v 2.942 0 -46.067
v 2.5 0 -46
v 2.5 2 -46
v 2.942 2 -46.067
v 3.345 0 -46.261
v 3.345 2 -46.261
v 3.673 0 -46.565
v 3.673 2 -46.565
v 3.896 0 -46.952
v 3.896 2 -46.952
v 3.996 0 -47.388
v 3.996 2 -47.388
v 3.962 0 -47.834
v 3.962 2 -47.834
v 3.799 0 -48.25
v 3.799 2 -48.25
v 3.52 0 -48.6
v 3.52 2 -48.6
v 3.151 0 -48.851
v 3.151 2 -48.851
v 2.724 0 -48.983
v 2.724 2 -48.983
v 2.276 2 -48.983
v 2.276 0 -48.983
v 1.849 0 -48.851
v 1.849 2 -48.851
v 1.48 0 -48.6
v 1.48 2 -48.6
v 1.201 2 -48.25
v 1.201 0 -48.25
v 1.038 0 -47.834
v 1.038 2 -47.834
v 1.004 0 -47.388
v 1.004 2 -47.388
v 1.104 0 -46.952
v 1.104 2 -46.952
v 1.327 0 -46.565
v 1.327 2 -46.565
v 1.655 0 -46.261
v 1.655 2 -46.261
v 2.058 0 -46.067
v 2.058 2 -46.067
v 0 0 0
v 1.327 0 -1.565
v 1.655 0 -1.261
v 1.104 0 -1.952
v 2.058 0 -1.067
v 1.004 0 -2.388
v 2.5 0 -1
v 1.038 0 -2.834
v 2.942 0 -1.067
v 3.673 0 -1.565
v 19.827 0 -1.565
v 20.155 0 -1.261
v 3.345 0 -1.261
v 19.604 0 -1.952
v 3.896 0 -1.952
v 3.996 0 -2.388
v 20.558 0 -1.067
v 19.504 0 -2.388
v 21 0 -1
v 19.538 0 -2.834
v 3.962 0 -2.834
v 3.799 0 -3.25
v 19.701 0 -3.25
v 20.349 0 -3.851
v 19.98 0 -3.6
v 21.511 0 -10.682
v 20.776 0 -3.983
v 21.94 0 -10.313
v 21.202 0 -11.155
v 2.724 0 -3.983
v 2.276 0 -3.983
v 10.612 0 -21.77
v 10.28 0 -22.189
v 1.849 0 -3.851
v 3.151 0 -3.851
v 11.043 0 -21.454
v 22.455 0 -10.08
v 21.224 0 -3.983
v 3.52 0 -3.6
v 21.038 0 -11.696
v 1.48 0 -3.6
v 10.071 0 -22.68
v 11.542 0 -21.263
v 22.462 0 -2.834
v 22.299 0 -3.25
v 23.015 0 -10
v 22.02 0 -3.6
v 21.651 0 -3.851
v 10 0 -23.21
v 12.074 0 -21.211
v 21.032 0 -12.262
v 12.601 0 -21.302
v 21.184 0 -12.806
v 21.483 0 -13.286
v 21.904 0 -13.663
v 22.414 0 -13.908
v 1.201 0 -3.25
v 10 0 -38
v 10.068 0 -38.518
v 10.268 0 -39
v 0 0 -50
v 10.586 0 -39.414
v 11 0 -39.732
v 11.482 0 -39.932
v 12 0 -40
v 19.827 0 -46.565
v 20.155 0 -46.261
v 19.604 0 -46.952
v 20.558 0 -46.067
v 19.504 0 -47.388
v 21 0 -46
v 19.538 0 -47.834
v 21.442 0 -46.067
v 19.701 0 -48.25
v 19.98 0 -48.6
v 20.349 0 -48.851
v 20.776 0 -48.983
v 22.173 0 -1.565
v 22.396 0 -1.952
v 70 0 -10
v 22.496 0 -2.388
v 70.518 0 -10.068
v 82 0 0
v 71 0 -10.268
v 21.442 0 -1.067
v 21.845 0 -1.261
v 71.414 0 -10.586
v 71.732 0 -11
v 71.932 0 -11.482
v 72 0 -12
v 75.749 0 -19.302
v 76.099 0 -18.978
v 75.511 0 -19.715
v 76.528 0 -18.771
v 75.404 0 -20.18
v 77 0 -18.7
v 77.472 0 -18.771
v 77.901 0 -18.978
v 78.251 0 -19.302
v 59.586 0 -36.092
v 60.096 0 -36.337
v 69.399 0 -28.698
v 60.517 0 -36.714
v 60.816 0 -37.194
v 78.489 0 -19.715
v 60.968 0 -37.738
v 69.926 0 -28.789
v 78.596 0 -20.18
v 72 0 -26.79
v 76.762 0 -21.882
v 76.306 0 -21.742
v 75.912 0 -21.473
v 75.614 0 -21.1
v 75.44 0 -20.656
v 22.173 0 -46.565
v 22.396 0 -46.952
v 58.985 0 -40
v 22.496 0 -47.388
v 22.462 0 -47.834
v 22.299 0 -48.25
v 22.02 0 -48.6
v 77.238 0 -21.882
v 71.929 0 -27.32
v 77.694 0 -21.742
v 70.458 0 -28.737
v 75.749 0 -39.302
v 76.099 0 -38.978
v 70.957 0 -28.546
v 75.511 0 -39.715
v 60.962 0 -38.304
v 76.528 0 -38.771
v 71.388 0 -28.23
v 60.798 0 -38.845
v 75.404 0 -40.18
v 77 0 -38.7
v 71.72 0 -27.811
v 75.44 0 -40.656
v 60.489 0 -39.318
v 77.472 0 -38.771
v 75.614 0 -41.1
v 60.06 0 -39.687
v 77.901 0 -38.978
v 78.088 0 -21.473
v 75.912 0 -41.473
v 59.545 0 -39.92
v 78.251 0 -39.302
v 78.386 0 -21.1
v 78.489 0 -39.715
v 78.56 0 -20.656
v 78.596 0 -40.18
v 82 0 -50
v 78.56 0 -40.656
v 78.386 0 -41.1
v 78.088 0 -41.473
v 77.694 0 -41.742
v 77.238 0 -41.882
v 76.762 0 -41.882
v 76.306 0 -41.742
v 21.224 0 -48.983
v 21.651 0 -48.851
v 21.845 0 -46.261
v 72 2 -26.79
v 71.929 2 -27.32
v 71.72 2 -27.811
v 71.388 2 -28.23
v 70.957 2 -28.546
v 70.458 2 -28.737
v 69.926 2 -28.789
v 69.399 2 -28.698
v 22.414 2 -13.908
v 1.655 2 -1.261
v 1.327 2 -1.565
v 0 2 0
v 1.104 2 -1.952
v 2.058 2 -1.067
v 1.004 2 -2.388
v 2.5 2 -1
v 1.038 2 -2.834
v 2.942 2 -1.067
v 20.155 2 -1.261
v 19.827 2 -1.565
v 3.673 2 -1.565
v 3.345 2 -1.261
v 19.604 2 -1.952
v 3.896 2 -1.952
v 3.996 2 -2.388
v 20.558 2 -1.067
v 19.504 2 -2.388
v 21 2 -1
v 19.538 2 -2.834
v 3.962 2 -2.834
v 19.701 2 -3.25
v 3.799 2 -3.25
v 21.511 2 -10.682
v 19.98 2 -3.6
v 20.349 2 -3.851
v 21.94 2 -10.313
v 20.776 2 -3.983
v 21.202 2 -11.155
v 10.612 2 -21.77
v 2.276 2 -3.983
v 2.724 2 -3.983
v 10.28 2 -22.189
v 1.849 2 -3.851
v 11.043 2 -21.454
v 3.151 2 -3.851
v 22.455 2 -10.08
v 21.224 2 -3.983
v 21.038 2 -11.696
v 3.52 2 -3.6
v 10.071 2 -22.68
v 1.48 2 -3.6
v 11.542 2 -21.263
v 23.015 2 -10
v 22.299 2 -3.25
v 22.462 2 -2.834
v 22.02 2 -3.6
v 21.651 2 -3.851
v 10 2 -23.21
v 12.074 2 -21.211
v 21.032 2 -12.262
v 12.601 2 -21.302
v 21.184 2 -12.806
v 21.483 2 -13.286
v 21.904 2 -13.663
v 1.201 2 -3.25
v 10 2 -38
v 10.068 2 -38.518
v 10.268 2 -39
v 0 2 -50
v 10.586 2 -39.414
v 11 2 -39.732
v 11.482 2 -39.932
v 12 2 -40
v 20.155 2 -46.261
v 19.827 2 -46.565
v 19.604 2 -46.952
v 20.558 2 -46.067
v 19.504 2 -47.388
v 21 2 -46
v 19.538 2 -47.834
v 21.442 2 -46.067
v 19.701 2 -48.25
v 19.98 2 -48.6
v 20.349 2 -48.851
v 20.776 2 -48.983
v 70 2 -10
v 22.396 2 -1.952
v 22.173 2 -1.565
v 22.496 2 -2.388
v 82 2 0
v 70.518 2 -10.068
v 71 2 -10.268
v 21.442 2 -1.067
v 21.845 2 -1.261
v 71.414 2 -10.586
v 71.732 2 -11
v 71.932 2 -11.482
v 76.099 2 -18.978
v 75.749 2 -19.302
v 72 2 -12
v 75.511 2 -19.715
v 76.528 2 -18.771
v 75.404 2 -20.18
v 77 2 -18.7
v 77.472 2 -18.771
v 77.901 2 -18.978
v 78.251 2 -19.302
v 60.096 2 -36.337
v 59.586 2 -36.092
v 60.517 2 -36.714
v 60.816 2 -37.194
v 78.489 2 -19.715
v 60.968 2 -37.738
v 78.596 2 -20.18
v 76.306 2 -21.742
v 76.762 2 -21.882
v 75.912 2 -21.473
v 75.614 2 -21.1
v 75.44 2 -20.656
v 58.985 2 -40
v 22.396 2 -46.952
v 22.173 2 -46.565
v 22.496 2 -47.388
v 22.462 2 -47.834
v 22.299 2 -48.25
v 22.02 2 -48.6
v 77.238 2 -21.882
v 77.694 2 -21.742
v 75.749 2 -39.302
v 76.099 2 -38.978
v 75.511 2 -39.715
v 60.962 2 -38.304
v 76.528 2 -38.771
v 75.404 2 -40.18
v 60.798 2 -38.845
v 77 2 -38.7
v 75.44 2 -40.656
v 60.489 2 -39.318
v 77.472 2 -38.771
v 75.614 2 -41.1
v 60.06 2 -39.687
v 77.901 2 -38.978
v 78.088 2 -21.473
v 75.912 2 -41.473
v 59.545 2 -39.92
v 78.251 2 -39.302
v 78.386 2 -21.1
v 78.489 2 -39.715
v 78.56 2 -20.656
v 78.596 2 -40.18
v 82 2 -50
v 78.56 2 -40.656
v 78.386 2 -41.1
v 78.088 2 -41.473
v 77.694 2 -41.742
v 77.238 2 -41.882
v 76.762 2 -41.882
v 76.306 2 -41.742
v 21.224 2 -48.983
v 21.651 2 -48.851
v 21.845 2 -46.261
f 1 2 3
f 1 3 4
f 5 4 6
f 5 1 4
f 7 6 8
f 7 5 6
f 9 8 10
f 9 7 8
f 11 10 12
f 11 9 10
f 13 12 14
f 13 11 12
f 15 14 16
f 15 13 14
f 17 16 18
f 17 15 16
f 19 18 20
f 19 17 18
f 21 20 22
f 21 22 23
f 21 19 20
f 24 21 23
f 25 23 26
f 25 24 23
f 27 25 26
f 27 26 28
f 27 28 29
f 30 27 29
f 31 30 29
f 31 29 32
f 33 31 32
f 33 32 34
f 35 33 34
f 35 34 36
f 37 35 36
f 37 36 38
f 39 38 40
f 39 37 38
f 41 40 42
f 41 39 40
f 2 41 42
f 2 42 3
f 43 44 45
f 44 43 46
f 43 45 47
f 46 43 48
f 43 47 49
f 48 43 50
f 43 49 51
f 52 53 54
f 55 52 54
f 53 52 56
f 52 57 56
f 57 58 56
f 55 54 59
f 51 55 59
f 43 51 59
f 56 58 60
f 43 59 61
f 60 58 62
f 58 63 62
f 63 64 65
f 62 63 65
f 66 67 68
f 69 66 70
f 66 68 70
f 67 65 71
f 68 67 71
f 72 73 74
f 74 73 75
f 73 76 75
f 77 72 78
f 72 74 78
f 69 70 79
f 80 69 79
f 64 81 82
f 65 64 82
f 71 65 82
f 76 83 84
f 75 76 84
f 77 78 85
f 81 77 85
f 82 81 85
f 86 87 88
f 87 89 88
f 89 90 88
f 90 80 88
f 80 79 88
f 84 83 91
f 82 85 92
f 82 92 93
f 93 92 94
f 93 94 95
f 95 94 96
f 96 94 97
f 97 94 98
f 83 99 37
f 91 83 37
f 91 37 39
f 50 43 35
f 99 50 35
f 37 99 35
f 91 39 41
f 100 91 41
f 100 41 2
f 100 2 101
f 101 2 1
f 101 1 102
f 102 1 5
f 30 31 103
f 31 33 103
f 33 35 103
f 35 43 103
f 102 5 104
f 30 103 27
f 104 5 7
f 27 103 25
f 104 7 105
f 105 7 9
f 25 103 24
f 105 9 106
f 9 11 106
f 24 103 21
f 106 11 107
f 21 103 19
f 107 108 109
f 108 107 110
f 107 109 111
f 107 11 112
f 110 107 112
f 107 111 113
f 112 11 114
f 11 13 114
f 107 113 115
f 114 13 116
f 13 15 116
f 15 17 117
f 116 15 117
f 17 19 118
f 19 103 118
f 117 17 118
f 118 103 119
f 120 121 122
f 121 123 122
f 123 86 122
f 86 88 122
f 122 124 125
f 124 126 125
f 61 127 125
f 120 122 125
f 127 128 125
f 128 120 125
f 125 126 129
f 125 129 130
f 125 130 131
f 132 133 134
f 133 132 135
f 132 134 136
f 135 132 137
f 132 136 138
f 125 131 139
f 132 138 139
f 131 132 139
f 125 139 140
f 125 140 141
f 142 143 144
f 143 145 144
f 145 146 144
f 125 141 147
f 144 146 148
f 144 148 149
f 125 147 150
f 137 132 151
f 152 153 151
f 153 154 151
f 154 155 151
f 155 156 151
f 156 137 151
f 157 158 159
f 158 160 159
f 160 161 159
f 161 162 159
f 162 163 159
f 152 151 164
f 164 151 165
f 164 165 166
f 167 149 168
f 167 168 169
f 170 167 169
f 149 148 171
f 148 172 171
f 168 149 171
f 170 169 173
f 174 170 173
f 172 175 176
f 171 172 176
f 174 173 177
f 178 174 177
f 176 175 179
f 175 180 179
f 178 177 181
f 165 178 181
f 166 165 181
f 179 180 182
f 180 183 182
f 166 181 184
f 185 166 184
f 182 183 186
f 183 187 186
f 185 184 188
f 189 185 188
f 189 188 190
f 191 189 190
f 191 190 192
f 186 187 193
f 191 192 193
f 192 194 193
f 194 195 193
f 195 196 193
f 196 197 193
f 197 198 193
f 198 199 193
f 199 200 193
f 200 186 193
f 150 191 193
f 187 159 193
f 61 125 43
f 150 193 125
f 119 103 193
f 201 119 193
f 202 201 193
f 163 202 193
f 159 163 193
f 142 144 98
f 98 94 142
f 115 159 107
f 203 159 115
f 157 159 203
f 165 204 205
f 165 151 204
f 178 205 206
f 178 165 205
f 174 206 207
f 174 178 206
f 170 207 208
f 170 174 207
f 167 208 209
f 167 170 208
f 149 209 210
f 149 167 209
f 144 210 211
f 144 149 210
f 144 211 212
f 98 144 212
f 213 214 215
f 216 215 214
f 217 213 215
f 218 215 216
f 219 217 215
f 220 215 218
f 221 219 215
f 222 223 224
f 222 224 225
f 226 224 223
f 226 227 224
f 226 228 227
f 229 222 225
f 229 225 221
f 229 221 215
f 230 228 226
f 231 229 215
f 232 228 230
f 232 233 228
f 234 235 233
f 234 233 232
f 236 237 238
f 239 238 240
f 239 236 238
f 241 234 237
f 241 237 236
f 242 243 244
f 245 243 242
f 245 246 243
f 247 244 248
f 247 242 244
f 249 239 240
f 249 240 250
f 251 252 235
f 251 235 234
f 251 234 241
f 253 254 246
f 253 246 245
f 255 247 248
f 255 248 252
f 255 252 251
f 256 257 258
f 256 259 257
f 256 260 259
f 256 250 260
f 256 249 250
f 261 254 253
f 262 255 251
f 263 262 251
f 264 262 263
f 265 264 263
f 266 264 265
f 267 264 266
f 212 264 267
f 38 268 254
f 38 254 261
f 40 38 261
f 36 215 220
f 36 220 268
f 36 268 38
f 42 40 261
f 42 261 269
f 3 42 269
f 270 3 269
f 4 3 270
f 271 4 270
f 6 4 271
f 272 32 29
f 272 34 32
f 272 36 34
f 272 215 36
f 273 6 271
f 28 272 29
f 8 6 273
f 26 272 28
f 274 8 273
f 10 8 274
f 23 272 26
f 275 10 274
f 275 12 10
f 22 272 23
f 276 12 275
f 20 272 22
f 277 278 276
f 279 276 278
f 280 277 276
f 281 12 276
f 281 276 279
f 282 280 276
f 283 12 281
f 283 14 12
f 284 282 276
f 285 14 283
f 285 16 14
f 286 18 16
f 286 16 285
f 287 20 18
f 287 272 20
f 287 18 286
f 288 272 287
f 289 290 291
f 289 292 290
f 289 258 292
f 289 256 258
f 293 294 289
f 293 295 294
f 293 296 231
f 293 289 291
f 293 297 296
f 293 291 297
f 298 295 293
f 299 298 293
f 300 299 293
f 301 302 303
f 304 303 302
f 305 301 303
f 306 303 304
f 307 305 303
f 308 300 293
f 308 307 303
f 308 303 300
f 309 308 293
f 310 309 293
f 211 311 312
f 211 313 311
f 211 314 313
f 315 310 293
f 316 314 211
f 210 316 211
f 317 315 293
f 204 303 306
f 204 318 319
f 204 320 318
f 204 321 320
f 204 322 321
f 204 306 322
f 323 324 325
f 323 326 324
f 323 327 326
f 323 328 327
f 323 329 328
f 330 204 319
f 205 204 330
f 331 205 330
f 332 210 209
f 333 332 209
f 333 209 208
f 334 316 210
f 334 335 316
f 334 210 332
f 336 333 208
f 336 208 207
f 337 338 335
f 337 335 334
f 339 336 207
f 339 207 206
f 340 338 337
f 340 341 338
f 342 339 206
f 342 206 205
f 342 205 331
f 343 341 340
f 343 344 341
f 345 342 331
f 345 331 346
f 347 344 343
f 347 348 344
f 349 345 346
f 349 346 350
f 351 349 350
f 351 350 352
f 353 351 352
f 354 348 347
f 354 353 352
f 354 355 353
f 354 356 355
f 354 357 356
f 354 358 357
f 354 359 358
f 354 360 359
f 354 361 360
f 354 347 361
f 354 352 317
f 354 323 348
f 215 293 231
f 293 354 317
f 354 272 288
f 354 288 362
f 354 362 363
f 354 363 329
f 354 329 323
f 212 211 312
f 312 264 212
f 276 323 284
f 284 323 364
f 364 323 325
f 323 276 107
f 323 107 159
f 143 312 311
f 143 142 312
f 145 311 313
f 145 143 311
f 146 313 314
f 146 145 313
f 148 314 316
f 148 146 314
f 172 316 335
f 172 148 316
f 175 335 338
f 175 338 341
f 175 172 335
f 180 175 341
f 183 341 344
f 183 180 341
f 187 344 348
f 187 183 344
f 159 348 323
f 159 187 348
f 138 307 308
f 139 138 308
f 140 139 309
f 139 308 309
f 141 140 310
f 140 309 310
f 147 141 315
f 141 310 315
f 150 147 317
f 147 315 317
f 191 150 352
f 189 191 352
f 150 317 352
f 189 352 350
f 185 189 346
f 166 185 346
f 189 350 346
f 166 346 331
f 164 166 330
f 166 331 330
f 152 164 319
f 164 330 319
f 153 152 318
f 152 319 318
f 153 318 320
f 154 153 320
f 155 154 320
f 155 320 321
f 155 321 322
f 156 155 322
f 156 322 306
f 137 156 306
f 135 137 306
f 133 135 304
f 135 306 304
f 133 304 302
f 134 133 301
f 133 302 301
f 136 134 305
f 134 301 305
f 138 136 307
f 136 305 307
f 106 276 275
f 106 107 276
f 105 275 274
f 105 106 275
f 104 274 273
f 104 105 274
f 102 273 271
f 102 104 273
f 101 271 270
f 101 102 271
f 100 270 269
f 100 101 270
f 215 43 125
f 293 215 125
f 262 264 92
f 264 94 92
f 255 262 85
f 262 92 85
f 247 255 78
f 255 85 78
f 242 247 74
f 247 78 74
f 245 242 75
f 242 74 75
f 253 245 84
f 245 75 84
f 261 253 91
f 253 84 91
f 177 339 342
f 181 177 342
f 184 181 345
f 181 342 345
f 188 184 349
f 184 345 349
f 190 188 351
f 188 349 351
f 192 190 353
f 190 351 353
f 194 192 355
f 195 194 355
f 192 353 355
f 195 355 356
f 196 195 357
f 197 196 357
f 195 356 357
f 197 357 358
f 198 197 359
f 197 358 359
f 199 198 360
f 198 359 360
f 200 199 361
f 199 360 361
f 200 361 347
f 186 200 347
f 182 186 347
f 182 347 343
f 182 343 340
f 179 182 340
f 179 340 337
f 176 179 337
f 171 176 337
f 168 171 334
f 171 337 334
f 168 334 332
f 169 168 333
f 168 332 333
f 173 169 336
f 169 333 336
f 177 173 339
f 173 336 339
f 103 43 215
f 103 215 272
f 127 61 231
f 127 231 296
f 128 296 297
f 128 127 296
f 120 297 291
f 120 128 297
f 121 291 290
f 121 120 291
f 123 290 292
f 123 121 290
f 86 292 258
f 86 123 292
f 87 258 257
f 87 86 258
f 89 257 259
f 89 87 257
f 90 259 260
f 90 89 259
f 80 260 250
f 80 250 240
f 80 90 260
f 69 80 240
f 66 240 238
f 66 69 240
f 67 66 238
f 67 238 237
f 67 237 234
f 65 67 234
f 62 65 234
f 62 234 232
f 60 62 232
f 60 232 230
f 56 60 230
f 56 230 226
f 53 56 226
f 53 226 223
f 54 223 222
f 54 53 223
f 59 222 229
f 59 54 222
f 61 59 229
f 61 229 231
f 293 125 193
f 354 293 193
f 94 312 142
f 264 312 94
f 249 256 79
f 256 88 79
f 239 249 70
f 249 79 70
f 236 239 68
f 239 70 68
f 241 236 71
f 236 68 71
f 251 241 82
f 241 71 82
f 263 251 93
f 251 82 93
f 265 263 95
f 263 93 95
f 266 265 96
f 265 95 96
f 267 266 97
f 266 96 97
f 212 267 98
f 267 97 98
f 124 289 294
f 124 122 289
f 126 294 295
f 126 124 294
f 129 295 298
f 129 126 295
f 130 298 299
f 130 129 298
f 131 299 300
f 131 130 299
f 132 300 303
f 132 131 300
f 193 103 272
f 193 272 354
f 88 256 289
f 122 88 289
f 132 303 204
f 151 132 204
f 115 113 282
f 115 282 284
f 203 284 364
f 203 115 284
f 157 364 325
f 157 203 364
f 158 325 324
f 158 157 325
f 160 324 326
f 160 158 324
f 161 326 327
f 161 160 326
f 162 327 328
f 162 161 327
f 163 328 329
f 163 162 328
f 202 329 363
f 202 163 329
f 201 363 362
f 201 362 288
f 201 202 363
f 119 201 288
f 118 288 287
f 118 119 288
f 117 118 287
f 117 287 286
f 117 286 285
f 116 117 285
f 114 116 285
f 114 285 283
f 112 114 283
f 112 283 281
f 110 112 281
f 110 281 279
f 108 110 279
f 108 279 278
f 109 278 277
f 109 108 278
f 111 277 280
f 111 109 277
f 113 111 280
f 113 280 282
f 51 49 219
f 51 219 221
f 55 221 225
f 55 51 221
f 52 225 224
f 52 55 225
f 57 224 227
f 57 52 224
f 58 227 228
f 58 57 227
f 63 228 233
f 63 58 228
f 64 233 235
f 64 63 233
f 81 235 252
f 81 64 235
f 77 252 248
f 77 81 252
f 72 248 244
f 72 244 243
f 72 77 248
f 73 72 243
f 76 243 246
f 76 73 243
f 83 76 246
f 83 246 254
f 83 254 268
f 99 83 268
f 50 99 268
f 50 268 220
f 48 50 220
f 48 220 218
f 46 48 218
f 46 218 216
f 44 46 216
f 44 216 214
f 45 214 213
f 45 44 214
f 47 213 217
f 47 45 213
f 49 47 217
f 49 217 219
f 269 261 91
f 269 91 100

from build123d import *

# Parameters (mm, degrees)
SKETCH_1_W          = 82
SKETCH_1_H          = 50
SKETCH_1_R          = 1.5
EXTRUDE_1_DEPTH     = 2
SKETCH_2_R          = 1.6
CUT_EXTRUDE_1_DEPTH = 2
CUT_EXTRUDE_2_DEPTH = 2
FILLET_1_R          = 2


with BuildPart() as part:
    # 草图1 → 凸台-拉伸1 (new body)
    with BuildSketch(Plane(origin=(0, 0, 0), x_dir=(1, 0, 0), z_dir=(0, 1, 0))):
        with Locations((41, 25)):
            Rectangle(SKETCH_1_W, SKETCH_1_H)
        with Locations(Location((2.5, 47.5, 0), (0, 0, 270))):
            Circle(SKETCH_1_R, mode=Mode.SUBTRACT)
        with Locations(Location((2.5, 2.5, 0), (0, 0, 270))):
            Circle(SKETCH_1_R, mode=Mode.SUBTRACT)
        with Locations(Location((21, 47.5, 0), (0, 0, 270))):
            Circle(SKETCH_1_R, mode=Mode.SUBTRACT)
        with Locations(Location((21, 2.5, 0), (0, 0, 270))):
            Circle(SKETCH_1_R, mode=Mode.SUBTRACT)
    extrude(amount=EXTRUDE_1_DEPTH)

    # 草图2 → 切除-拉伸1 (cut)
    with BuildSketch(Plane(origin=(0, 2, 0), x_dir=(1, 0, 0), z_dir=(0, 1, 0))):
        with Locations(Location((77, 20.3, 0), (0, 0, 270))):
            Circle(SKETCH_2_R)
        with Locations(Location((77, 40.3, 0), (0, 0, 270))):
            Circle(SKETCH_2_R)
    extrude(amount=-CUT_EXTRUDE_1_DEPTH, mode=Mode.SUBTRACT)

    # 草图4 → 切除-拉伸2 (cut)
    with BuildSketch(Plane(origin=(0, 2, 0), x_dir=(1, 0, 0), z_dir=(0, 1, 0))):
        Polygon((10, 10), (72, 10), (72, 29.516271877), align=None)
        Polygon((10, 20.483728123), (10, 40), (72, 40), align=None)
    extrude(amount=-CUT_EXTRUDE_2_DEPTH, mode=Mode.SUBTRACT)

    # 圆角1
    fillet_1_edges = [part.edges().sort_by_distance(p)[0] for p in [
        (72, 1, -40),
        (10, 1, -20.483728123),
        (10, 1, -40),
        (10, 1, -10),
        (72, 1, -29.516271877),
        (72, 1, -10),
    ]]
    fillet(fillet_1_edges, radius=FILLET_1_R)


solid = part.part
